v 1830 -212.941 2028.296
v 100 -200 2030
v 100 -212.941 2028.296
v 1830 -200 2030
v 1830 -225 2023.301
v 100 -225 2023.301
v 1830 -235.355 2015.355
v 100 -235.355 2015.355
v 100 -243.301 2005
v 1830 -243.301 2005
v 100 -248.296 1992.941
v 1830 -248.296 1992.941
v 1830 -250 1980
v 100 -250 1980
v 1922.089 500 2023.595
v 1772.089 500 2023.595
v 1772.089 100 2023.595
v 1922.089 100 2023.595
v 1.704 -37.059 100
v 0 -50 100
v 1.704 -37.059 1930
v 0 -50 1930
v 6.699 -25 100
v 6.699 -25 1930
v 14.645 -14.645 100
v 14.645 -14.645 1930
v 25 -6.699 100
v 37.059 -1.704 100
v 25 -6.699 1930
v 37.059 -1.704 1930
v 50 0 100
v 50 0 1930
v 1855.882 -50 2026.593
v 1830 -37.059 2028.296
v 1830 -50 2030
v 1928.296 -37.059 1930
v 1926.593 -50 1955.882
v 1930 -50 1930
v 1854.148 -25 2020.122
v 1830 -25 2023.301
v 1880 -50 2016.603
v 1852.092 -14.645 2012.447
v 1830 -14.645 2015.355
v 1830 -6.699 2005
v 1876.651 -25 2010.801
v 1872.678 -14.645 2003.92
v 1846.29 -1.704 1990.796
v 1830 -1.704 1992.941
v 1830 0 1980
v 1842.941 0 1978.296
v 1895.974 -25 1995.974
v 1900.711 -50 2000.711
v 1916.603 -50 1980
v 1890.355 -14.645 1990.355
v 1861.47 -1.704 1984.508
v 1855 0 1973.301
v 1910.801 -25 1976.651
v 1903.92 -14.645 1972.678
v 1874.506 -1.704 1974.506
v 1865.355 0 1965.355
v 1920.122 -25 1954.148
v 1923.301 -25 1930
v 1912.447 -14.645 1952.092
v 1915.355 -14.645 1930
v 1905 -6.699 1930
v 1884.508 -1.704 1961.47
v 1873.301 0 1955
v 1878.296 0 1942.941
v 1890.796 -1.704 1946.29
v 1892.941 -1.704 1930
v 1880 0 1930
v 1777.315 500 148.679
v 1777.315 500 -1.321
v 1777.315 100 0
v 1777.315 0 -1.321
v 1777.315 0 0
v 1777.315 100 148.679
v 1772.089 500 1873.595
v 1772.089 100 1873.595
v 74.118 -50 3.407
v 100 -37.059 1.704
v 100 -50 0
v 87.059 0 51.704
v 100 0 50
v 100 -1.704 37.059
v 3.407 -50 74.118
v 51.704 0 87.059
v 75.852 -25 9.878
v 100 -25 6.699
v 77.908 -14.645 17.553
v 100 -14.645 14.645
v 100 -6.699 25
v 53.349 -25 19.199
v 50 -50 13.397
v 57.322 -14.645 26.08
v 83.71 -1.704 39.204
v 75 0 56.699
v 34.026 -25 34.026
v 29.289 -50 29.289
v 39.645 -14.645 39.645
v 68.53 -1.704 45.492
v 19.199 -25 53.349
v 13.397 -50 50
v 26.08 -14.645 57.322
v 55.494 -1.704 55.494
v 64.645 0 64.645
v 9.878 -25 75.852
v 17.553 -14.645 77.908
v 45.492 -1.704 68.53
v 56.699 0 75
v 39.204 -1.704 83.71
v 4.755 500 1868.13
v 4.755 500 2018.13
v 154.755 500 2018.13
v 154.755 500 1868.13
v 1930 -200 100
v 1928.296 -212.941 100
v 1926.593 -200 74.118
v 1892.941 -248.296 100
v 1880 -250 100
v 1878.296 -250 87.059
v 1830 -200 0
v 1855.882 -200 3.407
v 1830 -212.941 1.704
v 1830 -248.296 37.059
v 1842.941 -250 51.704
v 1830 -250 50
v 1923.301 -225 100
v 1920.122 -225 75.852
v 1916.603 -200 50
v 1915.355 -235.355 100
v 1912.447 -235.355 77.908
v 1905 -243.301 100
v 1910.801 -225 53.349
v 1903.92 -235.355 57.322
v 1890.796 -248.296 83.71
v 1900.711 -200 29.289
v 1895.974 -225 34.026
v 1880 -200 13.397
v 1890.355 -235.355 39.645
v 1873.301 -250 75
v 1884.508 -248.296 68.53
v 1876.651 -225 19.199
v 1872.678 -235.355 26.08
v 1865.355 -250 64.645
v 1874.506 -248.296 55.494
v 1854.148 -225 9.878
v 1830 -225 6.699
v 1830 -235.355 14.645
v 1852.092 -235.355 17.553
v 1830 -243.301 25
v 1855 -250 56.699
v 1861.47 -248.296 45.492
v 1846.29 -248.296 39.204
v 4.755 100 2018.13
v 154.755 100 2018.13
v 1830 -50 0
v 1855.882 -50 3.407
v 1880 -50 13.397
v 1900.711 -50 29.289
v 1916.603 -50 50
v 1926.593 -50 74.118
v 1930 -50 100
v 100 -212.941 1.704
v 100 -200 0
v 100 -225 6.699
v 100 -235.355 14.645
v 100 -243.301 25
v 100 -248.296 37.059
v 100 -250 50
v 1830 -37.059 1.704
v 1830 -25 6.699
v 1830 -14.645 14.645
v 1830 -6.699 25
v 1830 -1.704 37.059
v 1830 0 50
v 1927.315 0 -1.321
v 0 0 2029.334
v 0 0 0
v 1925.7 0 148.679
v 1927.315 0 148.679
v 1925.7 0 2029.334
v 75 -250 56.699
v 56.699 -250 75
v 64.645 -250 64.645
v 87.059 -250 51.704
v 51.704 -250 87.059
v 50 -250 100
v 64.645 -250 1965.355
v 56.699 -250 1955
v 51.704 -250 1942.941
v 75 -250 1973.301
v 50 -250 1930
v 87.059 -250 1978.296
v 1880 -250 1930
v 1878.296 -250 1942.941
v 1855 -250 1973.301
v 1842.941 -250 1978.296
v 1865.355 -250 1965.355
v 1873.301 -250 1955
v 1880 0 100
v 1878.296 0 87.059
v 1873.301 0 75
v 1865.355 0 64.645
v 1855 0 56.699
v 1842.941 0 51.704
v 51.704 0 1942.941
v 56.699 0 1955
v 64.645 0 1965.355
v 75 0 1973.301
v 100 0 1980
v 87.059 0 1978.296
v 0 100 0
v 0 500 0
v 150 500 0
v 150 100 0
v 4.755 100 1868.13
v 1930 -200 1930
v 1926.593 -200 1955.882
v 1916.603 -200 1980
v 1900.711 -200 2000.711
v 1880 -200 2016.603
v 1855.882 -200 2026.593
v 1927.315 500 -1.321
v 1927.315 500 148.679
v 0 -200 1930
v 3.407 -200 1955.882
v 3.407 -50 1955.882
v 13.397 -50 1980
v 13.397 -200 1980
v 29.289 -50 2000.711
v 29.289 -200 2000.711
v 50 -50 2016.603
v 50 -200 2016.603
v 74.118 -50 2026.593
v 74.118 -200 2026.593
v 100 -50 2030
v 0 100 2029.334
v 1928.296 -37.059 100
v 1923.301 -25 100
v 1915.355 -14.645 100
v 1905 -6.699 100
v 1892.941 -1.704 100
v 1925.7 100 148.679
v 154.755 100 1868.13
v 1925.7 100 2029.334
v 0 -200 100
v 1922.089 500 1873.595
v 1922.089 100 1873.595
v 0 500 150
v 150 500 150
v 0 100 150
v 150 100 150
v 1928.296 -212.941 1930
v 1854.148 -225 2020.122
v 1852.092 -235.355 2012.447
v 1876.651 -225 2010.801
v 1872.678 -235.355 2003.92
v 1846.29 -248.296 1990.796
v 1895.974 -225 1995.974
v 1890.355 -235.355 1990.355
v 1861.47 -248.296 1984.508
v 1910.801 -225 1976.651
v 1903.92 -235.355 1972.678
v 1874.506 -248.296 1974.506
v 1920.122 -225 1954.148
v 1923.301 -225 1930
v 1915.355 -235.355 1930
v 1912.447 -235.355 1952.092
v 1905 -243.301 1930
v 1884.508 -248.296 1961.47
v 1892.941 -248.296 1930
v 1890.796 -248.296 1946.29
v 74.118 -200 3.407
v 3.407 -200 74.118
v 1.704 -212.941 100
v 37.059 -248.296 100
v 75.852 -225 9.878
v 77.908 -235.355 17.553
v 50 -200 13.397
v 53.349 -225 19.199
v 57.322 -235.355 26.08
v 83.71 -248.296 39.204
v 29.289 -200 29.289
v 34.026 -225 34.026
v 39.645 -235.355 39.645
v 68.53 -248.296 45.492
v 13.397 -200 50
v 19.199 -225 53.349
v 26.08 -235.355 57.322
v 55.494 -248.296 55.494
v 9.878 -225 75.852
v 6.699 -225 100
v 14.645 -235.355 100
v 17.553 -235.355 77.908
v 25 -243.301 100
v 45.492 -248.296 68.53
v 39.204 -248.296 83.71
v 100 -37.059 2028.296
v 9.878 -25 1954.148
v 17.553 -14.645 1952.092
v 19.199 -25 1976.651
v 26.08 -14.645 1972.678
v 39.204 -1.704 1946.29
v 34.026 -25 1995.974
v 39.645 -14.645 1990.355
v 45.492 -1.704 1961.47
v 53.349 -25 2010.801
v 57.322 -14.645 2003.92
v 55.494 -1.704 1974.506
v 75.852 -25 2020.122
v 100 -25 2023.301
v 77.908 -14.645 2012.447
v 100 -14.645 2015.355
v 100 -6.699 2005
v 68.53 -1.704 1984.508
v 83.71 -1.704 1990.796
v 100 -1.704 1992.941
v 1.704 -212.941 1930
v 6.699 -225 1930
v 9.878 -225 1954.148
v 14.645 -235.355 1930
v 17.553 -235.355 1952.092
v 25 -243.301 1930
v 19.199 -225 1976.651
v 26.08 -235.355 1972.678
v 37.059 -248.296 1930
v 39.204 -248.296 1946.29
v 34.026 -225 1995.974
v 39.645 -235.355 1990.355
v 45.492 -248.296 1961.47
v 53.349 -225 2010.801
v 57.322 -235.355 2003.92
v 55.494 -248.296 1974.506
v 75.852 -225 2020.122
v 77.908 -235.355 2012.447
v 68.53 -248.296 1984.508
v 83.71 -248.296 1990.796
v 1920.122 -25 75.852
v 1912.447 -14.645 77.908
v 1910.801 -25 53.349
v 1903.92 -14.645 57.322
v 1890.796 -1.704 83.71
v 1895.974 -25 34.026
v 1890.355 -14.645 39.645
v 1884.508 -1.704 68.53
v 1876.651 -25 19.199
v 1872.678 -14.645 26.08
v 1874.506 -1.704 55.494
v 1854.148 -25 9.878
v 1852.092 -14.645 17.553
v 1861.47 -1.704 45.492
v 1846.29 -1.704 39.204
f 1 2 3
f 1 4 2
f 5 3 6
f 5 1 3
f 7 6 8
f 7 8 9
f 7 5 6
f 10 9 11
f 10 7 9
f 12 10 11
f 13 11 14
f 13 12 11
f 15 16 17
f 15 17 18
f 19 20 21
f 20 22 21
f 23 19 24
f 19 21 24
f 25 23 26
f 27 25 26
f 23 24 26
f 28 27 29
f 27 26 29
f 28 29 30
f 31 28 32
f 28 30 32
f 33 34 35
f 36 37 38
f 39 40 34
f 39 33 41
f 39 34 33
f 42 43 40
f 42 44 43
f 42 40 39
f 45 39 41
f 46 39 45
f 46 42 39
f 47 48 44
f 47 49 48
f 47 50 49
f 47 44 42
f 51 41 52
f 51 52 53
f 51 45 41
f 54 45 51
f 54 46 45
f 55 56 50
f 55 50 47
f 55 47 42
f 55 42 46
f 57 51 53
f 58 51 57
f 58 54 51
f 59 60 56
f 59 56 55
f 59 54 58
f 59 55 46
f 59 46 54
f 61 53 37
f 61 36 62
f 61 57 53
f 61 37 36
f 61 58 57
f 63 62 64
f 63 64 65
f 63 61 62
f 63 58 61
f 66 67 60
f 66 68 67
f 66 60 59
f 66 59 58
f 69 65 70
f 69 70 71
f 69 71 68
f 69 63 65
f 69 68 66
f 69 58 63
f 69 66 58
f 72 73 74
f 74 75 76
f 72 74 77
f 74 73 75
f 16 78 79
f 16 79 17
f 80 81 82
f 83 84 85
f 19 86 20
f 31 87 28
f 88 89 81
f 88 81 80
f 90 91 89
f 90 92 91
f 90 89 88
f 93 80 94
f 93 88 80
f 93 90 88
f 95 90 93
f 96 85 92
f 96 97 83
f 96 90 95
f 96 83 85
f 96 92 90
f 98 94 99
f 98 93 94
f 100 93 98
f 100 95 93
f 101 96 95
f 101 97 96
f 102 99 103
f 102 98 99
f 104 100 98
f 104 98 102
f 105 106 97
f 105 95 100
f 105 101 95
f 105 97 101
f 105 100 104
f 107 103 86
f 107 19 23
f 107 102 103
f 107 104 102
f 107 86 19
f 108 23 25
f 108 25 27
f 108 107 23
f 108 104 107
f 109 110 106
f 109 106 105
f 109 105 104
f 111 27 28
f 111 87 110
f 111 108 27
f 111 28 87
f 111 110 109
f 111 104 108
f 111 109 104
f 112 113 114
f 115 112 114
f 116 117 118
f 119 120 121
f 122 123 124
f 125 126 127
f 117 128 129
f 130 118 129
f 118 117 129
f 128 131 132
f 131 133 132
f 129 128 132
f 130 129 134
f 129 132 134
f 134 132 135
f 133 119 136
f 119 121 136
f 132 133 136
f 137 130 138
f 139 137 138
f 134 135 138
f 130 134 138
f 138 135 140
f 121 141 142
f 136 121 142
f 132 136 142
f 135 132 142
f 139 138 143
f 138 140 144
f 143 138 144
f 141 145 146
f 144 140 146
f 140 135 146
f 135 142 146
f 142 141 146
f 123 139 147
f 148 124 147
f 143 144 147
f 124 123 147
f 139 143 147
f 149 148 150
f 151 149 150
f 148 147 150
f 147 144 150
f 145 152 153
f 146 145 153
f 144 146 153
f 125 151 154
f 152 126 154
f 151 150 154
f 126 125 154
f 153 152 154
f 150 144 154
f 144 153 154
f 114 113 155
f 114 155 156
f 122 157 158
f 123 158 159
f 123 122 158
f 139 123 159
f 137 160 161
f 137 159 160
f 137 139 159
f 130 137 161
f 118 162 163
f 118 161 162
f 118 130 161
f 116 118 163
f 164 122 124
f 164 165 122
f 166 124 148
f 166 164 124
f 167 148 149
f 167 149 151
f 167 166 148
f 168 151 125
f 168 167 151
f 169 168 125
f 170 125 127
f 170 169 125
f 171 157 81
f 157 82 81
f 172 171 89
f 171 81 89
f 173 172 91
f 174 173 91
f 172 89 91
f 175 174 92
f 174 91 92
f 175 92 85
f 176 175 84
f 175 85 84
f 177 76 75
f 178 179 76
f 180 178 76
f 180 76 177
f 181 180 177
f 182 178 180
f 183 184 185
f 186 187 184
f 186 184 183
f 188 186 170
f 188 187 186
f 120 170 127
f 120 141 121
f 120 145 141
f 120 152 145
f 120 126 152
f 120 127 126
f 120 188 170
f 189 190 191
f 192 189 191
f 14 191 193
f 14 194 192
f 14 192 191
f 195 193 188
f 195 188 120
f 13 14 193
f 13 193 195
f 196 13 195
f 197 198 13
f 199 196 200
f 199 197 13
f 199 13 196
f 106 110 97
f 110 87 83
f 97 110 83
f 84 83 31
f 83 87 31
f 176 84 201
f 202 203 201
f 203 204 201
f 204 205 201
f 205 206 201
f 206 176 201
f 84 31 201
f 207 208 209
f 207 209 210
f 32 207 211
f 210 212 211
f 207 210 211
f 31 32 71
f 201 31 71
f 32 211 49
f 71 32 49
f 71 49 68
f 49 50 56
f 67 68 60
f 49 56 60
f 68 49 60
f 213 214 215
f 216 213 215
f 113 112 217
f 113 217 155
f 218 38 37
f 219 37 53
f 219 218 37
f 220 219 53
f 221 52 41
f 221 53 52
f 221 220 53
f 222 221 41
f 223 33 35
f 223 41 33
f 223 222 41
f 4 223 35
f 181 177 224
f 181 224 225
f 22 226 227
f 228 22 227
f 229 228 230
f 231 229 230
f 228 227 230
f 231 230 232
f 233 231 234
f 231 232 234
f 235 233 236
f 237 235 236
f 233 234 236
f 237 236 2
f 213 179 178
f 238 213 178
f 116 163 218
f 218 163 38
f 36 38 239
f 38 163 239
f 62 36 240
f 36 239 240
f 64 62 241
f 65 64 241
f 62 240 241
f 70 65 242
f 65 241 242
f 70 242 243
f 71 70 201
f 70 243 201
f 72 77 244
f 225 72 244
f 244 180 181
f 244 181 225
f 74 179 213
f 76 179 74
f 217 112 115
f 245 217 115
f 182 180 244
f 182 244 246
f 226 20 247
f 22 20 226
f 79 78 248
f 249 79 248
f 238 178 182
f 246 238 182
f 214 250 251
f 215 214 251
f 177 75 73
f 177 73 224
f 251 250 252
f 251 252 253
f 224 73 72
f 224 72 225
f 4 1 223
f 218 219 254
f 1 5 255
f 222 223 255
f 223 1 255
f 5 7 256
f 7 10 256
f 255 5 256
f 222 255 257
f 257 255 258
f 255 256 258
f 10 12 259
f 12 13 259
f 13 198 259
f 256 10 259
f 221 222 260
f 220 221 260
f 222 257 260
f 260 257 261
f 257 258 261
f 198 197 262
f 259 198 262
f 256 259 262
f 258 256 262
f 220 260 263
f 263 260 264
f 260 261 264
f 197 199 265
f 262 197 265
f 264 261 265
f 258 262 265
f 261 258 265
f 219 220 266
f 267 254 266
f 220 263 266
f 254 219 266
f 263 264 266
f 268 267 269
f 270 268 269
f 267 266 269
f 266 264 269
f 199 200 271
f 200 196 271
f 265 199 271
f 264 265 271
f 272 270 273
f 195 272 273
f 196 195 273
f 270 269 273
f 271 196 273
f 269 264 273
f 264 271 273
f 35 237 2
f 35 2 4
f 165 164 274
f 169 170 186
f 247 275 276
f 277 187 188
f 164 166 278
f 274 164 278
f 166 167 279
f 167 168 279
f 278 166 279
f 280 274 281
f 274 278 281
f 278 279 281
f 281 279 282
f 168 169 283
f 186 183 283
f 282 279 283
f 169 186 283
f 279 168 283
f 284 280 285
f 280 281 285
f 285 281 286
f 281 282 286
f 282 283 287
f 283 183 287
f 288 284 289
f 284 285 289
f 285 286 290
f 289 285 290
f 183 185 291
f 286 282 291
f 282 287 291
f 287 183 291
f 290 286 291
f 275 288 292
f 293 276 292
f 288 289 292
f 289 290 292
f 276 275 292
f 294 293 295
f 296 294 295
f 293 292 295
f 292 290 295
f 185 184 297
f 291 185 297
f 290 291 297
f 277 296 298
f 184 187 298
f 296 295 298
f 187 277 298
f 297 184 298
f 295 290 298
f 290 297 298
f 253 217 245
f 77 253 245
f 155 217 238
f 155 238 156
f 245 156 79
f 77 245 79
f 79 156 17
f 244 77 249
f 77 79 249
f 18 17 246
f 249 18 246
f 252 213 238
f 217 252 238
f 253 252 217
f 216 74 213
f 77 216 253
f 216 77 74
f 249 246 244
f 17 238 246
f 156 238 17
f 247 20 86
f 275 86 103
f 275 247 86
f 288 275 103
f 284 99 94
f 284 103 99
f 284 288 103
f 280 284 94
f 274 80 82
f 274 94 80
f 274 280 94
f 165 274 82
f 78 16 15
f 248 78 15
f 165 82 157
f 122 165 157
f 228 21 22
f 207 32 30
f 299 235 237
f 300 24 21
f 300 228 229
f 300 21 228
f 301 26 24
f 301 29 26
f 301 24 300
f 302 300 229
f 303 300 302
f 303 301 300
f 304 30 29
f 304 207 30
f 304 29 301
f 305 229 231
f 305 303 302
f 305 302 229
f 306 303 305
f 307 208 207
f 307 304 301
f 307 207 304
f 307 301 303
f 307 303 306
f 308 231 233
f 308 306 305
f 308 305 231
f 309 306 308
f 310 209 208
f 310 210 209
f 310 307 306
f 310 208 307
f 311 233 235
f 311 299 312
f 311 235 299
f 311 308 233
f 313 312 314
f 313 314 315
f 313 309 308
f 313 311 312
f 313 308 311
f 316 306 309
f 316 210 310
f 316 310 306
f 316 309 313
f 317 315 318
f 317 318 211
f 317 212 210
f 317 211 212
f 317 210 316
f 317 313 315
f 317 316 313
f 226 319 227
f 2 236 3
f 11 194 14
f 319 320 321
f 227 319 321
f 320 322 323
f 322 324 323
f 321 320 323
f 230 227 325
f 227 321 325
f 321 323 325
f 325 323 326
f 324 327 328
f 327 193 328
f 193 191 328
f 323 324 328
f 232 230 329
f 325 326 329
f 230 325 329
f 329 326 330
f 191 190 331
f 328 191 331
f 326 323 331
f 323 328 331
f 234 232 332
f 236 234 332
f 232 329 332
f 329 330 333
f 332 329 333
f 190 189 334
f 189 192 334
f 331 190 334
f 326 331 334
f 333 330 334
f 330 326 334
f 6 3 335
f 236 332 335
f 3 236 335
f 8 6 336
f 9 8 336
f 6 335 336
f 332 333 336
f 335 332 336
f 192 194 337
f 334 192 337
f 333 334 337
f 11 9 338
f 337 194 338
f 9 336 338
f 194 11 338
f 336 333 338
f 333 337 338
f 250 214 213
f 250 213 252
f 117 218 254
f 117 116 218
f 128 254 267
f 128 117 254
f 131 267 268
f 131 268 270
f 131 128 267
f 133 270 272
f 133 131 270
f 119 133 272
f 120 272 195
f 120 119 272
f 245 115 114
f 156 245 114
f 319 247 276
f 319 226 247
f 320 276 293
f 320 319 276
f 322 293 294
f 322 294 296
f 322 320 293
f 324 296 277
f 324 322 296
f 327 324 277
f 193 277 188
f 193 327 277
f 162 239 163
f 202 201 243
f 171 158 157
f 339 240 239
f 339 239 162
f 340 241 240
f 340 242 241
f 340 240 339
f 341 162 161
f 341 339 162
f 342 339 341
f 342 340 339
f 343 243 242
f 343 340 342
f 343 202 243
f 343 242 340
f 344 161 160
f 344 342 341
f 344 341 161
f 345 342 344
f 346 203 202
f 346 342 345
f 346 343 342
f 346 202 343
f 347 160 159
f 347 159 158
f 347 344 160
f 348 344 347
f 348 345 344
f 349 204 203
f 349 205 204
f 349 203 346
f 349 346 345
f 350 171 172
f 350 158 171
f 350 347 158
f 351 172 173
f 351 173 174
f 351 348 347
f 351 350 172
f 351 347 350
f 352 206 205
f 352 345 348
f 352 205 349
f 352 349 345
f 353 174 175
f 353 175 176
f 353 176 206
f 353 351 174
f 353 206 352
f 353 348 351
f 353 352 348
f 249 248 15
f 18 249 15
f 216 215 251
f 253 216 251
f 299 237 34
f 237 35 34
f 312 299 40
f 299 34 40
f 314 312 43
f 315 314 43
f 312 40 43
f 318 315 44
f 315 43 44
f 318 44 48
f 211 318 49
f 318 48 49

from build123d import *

# Parameters (mm, degrees)
SKETCH_W     = 1930
SKETCH_H     = 2030
PAD_DEPTH    = 250
FILLET_R     = 100
FILLET001_R  = 50
SKETCH001_W  = 1925.700439
SKETCH001_H  = 2029.334473
PAD001_DEPTH = 100
SKETCH002_W  = 150
SKETCH002_H  = 150
PAD002_DEPTH = 500
SKETCH003_W  = 150
SKETCH003_H  = 150
PAD003_DEPTH = 500
SKETCH004_W  = 150
SKETCH004_H  = 150
PAD004_DEPTH = 500
SKETCH005_W  = 150
SKETCH005_H  = 150
PAD005_DEPTH = 500


with BuildPart() as body:
    # Sketch → Pad (new body)
    with BuildSketch(Plane.XZ):
        with Locations((965, 1015)):
            Rectangle(SKETCH_W, SKETCH_H)
    extrude(amount=PAD_DEPTH)

    # Fillet
    fillet_edges = [body.edges().sort_by_distance(p)[0] for p in [
        (0, -125, 2030),
        (1930, -125, 2030),
        (1930, -125, 0),
        (0, -125, 0),
    ]]
    fillet(fillet_edges, radius=FILLET_R)

    # Fillet001
    fillet001_edges = [body.edges().sort_by_distance(p)[0] for p in [
        (0, -250, 1015),
        (29.289322, -250, 29.289322),
        (965, -250, 0),
        (1900.710678, -250, 29.289322),
        (1930, -250, 1015),
        (1900.710678, -250, 2000.710678),
        (965, -250, 2030),
        (29.289322, -250, 2000.710678),
        (0, 0, 1015),
        (29.289322, 0, 2000.710678),
        (965, 0, 2030),
        (1900.710678, 0, 2000.710678),
        (1930, 0, 1015),
        (1900.710678, 0, 29.289322),
        (965, 0, 0),
        (29.289322, 0, 29.289322),
    ]]
    fillet(fillet001_edges, radius=FILLET001_R)


with BuildPart() as body001:
    # Sketch001 → Pad001 (new body)
    with BuildSketch(Plane.XZ):
        with Locations((962.850219, 1014.667236)):
            Rectangle(SKETCH001_W, SKETCH001_H)
    extrude(amount=-PAD001_DEPTH)

    # Sketch002 → Pad002 (join)
    with BuildSketch(Plane.XZ):
        with Locations((75, 75)):
            Rectangle(SKETCH002_W, SKETCH002_H)
    extrude(amount=-PAD002_DEPTH)

    # Sketch003 → Pad003 (join)
    with BuildSketch(Plane.XZ):
        with Locations((1852.314697, 73.679027)):
            Rectangle(SKETCH003_W, SKETCH003_H)
    extrude(amount=-PAD003_DEPTH)

    # Sketch004 → Pad004 (join)
    with BuildSketch(Plane.XZ):
        with Locations((79.754996, 1943.130493)):
            Rectangle(SKETCH004_W, SKETCH004_H)
    extrude(amount=-PAD004_DEPTH)

    # Sketch005 → Pad005 (join)
    with BuildSketch(Plane.XZ):
        with Locations((1847.088867, 1948.594971)):
            Rectangle(SKETCH005_W, SKETCH005_H)
    extrude(amount=-PAD005_DEPTH)


solid = Compound([body.part, body001.part])
